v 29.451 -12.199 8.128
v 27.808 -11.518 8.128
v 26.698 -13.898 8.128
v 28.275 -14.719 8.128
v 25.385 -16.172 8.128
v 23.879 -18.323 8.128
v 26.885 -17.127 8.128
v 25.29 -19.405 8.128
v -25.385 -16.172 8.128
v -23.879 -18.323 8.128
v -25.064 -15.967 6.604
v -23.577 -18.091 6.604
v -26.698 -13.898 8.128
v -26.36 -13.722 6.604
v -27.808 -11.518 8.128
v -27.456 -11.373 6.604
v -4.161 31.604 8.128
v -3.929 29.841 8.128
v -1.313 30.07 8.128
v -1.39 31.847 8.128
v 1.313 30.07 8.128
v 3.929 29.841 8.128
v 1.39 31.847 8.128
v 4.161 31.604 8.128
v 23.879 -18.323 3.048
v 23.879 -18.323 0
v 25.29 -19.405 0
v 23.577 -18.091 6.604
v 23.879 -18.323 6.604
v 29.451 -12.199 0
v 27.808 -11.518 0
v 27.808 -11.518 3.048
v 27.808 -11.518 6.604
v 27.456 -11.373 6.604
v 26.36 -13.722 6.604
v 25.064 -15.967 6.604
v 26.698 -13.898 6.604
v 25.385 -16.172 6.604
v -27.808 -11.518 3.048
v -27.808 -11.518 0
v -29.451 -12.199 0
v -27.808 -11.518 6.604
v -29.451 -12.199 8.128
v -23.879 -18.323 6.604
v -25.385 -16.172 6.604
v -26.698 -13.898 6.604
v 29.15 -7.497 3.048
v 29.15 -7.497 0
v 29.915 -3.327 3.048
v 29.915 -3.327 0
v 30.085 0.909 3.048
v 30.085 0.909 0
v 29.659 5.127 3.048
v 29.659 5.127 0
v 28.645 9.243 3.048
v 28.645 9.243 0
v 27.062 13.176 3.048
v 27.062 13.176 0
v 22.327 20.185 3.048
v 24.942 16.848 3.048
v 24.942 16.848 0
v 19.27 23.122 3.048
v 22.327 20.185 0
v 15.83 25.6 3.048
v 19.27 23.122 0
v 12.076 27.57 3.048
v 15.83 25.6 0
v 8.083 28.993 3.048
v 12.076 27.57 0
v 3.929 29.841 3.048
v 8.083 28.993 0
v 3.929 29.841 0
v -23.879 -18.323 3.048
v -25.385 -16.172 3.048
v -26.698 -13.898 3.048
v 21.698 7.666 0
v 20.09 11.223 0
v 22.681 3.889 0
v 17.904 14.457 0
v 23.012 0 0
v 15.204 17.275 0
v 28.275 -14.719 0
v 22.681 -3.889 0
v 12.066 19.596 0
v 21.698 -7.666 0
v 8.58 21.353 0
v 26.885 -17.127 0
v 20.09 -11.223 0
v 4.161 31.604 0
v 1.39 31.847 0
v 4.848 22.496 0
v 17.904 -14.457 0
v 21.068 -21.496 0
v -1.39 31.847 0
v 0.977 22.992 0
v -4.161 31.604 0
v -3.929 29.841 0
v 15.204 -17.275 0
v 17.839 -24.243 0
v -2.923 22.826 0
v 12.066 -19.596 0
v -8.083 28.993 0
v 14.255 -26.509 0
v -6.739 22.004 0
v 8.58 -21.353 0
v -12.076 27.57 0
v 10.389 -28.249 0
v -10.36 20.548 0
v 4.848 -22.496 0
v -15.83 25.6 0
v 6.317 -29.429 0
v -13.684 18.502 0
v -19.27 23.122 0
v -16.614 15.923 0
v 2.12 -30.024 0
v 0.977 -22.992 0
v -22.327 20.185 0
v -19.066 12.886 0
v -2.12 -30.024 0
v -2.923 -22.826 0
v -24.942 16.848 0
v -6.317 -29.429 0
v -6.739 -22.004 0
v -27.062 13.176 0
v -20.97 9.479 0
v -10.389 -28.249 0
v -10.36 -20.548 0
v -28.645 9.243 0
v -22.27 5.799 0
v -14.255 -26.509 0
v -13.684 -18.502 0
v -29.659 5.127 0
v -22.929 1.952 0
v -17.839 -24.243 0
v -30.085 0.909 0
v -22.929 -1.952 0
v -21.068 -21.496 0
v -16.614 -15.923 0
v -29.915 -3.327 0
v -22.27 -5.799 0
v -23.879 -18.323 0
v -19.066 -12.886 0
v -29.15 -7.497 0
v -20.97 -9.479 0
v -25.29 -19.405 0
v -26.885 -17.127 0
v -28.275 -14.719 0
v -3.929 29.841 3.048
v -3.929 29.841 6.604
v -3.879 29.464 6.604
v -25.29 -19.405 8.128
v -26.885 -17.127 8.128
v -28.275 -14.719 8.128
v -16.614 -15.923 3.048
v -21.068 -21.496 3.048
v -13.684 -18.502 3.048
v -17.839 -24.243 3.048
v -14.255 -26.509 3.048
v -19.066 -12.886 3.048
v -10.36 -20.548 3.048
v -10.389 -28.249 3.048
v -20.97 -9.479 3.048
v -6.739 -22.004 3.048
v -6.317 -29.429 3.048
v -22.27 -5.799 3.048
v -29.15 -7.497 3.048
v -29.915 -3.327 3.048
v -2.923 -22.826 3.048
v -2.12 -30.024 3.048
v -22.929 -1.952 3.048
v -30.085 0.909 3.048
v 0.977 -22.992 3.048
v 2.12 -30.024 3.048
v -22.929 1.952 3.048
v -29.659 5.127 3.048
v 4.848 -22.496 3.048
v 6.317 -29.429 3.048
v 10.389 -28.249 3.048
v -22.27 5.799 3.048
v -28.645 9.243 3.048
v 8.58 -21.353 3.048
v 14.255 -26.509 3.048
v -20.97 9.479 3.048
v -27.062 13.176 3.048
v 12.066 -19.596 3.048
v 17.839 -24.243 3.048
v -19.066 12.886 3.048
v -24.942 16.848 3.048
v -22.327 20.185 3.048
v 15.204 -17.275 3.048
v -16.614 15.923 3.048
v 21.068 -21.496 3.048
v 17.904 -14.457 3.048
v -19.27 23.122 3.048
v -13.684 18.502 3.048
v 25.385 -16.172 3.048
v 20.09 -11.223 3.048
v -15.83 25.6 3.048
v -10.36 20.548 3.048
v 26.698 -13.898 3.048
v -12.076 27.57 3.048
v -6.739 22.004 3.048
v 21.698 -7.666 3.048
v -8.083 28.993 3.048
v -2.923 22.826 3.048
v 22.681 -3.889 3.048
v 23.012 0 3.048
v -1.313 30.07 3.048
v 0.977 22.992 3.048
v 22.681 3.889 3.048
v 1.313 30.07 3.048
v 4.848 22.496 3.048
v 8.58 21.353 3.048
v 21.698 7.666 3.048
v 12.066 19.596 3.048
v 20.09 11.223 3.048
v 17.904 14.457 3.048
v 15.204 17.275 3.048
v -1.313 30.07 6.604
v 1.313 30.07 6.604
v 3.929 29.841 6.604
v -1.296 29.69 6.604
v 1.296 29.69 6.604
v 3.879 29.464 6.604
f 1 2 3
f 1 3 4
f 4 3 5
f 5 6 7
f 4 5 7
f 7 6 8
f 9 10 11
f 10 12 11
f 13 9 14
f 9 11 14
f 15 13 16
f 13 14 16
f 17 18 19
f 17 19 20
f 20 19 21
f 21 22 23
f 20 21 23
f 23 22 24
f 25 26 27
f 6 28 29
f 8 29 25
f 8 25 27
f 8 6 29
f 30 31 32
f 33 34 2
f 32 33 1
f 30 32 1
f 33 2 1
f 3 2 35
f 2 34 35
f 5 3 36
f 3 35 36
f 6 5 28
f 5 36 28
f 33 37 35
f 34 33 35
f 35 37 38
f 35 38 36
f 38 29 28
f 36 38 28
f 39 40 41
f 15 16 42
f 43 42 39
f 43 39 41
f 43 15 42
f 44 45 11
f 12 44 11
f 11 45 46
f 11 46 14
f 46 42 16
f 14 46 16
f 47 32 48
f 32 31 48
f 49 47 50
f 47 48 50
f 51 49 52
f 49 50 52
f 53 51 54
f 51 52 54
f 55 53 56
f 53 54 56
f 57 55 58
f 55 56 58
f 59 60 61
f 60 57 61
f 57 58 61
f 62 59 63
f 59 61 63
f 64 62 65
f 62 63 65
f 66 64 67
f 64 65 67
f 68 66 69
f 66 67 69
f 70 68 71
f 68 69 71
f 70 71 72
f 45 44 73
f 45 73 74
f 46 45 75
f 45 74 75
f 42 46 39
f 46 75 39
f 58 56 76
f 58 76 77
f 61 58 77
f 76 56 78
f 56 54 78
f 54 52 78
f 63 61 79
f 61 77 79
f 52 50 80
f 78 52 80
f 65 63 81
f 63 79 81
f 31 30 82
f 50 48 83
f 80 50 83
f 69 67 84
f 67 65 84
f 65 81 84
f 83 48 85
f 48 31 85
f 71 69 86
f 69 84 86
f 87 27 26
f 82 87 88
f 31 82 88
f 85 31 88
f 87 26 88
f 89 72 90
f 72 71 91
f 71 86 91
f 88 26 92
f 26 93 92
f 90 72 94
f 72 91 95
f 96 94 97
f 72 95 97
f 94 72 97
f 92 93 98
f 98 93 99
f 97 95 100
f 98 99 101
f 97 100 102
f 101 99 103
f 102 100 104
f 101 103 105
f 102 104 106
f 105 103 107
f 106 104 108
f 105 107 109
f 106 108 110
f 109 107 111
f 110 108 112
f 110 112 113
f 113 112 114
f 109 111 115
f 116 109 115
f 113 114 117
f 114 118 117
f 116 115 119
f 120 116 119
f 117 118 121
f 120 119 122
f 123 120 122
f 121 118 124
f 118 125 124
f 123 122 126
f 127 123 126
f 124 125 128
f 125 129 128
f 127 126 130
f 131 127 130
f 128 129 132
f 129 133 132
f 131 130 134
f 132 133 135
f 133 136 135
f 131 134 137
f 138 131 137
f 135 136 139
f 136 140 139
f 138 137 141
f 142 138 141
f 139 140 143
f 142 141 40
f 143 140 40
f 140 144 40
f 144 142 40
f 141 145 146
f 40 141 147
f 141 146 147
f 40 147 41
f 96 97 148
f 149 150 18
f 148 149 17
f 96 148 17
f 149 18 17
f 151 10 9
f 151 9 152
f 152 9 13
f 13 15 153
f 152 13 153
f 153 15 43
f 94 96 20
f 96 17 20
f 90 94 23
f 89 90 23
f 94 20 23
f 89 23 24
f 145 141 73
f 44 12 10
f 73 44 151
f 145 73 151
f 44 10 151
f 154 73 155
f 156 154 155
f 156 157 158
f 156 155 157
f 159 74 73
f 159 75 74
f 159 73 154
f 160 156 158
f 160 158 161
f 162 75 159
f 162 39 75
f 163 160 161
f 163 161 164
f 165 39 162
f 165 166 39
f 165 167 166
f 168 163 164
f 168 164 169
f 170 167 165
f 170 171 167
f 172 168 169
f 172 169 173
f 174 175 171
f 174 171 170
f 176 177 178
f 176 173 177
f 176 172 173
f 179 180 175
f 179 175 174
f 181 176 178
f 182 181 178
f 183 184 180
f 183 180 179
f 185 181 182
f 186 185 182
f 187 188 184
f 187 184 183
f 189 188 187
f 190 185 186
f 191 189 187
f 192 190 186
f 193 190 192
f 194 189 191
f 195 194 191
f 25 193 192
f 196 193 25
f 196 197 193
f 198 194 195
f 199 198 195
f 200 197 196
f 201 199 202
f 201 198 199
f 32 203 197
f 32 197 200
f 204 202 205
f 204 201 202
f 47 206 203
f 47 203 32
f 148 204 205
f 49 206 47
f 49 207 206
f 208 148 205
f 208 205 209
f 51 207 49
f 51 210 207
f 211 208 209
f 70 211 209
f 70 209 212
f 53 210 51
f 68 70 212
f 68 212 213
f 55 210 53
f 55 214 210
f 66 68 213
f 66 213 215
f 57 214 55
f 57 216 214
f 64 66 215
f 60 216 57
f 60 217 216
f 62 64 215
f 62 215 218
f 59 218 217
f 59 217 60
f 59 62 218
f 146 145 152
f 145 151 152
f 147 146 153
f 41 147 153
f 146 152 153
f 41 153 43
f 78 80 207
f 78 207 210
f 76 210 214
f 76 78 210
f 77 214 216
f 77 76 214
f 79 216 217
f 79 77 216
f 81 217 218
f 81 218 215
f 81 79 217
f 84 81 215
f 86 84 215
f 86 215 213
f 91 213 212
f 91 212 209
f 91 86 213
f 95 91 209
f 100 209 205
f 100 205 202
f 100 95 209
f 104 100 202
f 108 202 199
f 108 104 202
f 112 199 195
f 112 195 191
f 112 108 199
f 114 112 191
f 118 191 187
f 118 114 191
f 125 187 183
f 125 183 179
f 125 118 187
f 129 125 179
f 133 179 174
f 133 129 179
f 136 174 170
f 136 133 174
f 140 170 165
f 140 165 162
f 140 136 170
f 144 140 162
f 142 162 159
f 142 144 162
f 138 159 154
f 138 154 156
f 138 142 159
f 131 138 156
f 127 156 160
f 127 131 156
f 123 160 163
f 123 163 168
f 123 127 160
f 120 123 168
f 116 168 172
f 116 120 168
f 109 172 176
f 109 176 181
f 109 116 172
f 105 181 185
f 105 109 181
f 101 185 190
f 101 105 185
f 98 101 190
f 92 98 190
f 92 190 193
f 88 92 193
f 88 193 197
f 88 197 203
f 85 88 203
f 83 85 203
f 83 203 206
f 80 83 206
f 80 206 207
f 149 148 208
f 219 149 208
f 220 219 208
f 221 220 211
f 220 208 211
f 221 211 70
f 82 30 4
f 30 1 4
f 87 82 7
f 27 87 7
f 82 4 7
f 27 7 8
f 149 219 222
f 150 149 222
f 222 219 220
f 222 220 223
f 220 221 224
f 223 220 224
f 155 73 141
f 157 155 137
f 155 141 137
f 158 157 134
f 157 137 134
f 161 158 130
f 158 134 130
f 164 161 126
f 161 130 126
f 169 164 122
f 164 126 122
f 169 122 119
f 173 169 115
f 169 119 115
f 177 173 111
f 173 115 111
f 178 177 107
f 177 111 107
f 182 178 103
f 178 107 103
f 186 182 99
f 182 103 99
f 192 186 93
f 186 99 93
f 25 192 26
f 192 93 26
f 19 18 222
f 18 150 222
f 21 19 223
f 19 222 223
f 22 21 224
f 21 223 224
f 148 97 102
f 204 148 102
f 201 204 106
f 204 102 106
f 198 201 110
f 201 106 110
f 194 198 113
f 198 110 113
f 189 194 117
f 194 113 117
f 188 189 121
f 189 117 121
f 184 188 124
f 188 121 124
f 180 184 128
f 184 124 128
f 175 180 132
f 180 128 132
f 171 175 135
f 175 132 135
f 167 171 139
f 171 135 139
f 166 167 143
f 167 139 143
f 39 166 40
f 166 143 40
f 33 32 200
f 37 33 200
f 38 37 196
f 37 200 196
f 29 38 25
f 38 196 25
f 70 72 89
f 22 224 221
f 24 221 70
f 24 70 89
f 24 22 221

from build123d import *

# Parameters (mm, degrees)
F0_R            = 30.099
F0_R_2          = 23.0124
F1_DEPTH        = 3.048
F3_ANGLE_BACK   = 7.5
F3_ANGLE        = 15
F3_COPIES_COUNT = 3


# Not quite as in the source:
# - a pattern or mirror of a feature is missing from the dataset's text; its kind, count and spacing are read off the source's solid


with BuildPart() as f1:
    # F0 (on Top) → F1 (new body)
    with BuildSketch(Plane.XY):
        Circle(F0_R)
        Circle(F0_R_2, mode=Mode.SUBTRACT)
    extrude(amount=F1_DEPTH)

    # F2 (on Right) → F3 (revolve)
    with BuildSketch(Plane.YZ, mode=Mode.PRIVATE) as f3_sk:
        Polygon((30.099, 6.604), (30.099, 3.048), (30.099, 0), (31.877, 0), (31.877, 8.128), (30.099, 8.128), align=None)
        Polygon((29.718, 6.604), (30.099, 6.604), (30.099, 8.128), align=None)
    f3 = revolve(f3_sk.sketch.rotate(Axis((0, 0, 0), (0, 0, -1)), -F3_ANGLE_BACK), axis=Axis((0, 0, 0), (0, 0, -1)), revolution_arc=F3_ANGLE)

    # F3_copies: F3 ×3 about axis
    f3_copies_axis = Axis((0, 0, 0), (0, 0, 1))
    for i in range(1, F3_COPIES_COUNT):
        add(f3.rotate(f3_copies_axis, i * 360 / F3_COPIES_COUNT))


solid = f1.part
